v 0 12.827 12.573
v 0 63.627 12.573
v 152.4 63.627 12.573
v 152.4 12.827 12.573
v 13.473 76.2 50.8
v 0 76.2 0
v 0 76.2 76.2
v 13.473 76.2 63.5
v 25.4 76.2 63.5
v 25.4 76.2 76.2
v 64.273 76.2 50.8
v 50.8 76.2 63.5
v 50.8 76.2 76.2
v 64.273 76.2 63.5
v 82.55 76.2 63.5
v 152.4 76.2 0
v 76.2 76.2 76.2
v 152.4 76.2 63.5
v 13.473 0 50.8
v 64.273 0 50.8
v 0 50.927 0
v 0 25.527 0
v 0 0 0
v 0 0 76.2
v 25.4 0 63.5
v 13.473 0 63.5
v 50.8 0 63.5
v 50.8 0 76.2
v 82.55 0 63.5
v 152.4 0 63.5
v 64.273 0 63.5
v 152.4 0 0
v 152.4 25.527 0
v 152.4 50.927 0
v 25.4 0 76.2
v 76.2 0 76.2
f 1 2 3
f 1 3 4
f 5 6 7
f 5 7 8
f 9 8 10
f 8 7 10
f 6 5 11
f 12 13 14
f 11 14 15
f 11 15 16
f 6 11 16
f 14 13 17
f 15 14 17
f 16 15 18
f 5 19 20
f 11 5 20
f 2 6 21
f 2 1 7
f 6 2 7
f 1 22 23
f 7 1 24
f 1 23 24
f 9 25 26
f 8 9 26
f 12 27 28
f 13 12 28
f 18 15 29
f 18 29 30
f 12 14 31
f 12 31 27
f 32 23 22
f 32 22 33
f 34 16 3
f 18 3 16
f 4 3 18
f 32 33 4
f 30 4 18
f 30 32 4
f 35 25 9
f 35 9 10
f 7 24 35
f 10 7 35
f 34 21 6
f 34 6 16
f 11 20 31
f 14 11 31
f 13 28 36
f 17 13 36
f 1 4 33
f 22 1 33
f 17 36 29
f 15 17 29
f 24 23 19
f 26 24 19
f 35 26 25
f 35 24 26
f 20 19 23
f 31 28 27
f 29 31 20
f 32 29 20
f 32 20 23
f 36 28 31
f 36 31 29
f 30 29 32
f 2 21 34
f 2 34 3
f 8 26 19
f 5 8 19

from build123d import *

# Parameters (mm, degrees)
F0_W      = 152.4
F0_H      = 76.2
F1_DEPTH  = 76.2
F3_DEPTH  = 152.4
F4_W      = 69.85
F4_H      = 12.7
F5_DEPTH  = 76.2
F7_DEPTH  = 76.2
F8_W      = 25.4
F8_H      = 12.7
F9_DEPTH  = 76.2
F11_DEPTH = 76.2


# Not quite as in the source:
# - a feature names something its author has since deleted; it is built from what else it names


with BuildPart() as f1:
    # F0 (on Front) → F1 (new body)
    with BuildSketch(Plane.XZ):
        with Locations((76.2, 38.1)):
            Rectangle(F0_W, F0_H)
    extrude(amount=-F1_DEPTH)

    # F2 (on face) → F3 (cut)
    with BuildSketch(Plane.YZ.offset(152.4)):
        Polygon((25.5270022899, 0), (38.1, 0), (50.9269982576, 0), (63.6270046234, 12.573000975), (12.8270015121, 12.573000975), align=None)
    extrude(amount=-F3_DEPTH, mode=Mode.SUBTRACT)

    # F4 (on face) → F5 (cut)
    with BuildSketch(Plane.XZ):
        with Locations((117.475, 69.85)):
            Rectangle(F4_W, F4_H)
    extrude(amount=-F5_DEPTH, mode=Mode.SUBTRACT)

    # F6 (on face) → F7 (cut)
    with BuildSketch(Plane.XZ):
        Polygon((76.2, 76.2), (82.55, 63.5), (82.55, 76.2), align=None)
    extrude(amount=-F7_DEPTH, mode=Mode.SUBTRACT)

    # F8 (on face) → F9 (cut)
    with BuildSketch(Plane.XZ):
        with Locations((38.1, 69.85)):
            Rectangle(F8_W, F8_H)
    extrude(amount=-F9_DEPTH, mode=Mode.SUBTRACT)

    # F10 (on face) → F11 (cut)
    with BuildSketch(Plane.XZ):
        Polygon((64.2725850075, 63.5), (38.1, 63.5), (13.4725850075, 63.5), (13.4725850075, 50.8), (64.2725850075, 50.8), align=None)
    extrude(amount=-F11_DEPTH, mode=Mode.SUBTRACT)


solid = f1.part
